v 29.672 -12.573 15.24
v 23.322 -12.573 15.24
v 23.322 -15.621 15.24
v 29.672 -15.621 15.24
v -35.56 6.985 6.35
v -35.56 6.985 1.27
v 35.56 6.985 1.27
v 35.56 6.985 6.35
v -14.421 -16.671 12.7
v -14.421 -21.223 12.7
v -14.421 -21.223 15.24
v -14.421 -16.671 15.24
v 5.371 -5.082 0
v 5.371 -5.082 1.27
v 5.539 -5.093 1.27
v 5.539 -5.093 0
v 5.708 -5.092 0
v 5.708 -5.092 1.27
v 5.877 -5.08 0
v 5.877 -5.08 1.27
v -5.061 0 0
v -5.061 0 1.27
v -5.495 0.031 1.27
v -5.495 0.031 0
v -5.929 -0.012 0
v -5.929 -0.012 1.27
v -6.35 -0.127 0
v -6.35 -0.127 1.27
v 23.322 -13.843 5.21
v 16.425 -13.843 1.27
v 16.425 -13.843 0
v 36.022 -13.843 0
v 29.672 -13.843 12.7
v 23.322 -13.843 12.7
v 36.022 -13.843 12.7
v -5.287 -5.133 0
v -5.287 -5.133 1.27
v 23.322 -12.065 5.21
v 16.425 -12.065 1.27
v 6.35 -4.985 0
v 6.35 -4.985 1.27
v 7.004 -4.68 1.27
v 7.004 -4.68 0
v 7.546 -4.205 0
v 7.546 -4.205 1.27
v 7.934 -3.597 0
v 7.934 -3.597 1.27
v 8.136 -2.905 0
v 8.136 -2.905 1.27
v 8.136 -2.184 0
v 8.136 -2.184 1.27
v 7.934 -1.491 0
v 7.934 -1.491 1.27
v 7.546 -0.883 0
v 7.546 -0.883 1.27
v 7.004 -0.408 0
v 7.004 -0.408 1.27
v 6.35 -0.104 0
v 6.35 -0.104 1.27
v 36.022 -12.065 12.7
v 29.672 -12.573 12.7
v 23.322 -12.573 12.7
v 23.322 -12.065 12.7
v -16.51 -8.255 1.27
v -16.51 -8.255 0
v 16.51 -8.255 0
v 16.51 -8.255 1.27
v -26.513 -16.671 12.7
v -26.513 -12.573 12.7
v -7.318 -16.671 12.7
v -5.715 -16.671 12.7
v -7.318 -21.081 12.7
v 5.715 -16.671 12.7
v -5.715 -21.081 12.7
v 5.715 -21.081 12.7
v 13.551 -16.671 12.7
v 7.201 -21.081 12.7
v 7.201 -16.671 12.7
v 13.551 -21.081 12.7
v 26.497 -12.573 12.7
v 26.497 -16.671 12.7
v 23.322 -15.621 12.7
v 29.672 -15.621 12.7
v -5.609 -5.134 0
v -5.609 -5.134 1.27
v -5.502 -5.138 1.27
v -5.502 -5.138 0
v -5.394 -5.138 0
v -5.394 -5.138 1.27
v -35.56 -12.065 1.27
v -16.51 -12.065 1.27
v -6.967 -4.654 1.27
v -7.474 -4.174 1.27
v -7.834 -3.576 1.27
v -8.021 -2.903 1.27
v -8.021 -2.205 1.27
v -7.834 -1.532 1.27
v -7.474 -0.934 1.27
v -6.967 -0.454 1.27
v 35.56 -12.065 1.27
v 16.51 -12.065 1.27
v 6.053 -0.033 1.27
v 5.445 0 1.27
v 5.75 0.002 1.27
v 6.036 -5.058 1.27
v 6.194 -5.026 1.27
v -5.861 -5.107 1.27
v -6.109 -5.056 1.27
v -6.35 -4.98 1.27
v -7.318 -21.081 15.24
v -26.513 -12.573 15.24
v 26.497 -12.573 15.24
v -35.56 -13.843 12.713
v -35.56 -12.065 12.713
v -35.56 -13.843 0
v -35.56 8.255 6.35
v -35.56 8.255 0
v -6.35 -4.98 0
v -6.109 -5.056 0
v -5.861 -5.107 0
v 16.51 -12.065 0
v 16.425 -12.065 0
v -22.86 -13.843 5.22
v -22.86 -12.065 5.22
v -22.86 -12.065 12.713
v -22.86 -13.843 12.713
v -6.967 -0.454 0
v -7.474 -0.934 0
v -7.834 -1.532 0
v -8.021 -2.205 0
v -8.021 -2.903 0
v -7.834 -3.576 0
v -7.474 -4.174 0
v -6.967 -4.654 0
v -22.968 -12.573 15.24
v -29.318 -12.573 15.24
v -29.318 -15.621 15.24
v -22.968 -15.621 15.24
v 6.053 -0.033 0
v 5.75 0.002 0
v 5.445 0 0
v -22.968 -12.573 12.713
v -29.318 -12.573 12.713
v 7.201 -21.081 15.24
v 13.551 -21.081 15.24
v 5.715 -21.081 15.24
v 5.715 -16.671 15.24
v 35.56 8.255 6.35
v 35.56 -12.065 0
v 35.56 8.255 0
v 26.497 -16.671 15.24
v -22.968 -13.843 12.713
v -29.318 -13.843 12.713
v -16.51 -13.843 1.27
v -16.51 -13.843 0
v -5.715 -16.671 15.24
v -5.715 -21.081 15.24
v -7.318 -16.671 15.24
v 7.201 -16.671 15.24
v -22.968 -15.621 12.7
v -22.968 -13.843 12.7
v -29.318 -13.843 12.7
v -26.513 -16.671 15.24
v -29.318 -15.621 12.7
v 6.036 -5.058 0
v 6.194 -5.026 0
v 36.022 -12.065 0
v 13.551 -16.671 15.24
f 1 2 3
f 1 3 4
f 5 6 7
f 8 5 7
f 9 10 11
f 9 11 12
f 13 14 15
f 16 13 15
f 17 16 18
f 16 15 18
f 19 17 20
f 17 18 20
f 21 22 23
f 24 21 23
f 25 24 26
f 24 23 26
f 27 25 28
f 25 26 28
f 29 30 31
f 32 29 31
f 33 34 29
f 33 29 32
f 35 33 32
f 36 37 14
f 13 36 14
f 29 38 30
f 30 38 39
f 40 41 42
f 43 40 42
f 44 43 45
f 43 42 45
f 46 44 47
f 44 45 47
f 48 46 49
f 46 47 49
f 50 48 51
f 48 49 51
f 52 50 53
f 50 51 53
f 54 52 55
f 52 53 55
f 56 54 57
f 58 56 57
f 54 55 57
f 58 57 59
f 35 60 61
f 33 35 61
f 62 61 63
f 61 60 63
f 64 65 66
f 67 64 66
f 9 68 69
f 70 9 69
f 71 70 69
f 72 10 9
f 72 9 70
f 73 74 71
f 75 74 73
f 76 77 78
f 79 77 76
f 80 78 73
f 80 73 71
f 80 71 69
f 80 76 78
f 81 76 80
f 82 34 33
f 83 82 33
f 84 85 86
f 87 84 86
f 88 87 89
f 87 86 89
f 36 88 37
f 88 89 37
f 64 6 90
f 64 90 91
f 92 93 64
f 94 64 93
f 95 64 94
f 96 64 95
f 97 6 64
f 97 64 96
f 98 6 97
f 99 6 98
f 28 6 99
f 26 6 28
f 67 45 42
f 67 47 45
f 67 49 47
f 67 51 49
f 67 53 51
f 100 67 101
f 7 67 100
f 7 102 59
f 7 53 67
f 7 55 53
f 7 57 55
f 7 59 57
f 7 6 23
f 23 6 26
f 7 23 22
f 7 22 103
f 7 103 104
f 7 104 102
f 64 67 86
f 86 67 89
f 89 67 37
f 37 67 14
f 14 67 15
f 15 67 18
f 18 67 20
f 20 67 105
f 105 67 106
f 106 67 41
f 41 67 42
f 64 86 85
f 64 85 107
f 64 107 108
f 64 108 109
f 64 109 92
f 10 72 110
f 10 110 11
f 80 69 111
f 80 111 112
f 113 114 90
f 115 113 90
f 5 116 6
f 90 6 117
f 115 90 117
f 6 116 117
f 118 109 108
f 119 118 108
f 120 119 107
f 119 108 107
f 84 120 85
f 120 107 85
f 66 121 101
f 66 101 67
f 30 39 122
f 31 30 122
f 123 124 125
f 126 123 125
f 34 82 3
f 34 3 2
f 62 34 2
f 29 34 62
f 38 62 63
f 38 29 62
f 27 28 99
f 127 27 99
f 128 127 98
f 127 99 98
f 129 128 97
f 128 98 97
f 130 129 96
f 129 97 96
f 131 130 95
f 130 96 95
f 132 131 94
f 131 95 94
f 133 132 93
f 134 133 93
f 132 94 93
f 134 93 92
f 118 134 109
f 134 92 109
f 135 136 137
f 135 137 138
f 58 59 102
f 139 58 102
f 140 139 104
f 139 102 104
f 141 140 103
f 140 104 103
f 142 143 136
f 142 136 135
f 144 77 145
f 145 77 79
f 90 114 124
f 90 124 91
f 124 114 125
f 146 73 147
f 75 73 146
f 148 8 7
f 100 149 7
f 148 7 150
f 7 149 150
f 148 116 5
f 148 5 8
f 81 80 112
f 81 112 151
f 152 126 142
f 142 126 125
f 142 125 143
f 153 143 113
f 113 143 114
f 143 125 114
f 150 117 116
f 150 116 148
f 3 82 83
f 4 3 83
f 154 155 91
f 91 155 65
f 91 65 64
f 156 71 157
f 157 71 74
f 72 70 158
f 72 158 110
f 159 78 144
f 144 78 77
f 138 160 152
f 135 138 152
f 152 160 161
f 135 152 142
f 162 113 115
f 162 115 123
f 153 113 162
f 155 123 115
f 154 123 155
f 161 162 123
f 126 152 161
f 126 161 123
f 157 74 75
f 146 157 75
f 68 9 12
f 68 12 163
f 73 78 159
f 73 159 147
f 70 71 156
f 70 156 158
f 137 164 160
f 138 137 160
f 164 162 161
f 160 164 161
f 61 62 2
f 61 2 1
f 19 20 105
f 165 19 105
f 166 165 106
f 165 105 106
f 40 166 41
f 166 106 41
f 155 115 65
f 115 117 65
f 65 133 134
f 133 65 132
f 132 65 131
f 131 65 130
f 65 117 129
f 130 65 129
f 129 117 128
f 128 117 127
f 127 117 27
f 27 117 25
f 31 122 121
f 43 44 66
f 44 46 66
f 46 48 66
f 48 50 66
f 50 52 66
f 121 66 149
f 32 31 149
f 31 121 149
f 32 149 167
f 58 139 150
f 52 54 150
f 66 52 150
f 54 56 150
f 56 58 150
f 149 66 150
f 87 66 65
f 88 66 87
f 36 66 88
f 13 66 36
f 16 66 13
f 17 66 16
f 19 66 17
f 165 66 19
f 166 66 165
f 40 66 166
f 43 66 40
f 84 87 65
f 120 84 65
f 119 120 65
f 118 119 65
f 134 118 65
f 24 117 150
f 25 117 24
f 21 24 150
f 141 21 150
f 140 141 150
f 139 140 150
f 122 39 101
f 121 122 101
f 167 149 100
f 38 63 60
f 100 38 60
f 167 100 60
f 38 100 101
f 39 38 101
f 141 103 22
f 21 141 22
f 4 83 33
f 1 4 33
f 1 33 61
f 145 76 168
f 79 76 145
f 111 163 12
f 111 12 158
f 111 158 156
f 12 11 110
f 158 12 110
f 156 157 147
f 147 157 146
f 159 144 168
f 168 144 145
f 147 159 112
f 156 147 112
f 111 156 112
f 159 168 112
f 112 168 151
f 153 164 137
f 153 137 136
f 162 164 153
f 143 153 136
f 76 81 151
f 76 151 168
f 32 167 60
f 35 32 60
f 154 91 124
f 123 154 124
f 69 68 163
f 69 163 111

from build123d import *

# Parameters (mm, degrees)
F0_W      = 19.05
F0_H      = 3.81
F1_DEPTH  = 1.27
F3_DEPTH  = 25.4
F4_W      = 71.12
F4_H      = 1.27
F5_DEPTH  = 5.08
F7_DEPTH  = 1.778
F8_W      = 6.35
F8_H      = 3.048
F9_DEPTH  = 2.54
F10_W     = 6.35
F10_H     = 2.1337494254
F10_H_2   = 4.4097490609
F10_W_2   = 11.43
F11_DEPTH = 2.54


with BuildPart() as f1:
    # F0 (on Top) → F1 (new body)
    with BuildSketch(Plane.XY):
        with Locations((26.035, -10.16)):
            Rectangle(F0_W, F0_H)
        Polygon((16.51, -8.255), (35.56, -8.255), (35.56, 8.255), (-35.56, 8.255), (-35.56, -8.255), (-16.51, -8.255), align=None)
        with Locations((-26.035, -10.16)):
            Rectangle(F0_W, F0_H)
    extrude(amount=F1_DEPTH)

    # F2 (on face) → F3 (cut)
    with BuildSketch(Plane.XY.offset(1.27)):
        with BuildLine():
            ThreePointArc((5.8767703432, -5.08), (6.1156478498, -5.043531091), (6.35, -4.984611534))
            Line((6.35, -4.984611534), (6.35, -0.1037009401))
            ThreePointArc((6.35, -0.1037009401), (5.9019976777, -0.0110749589), (5.4446542636, 0))
            Line((5.4446542636, 0), (-5.0605102442, 0))
            ThreePointArc((-5.0605102442, 0), (-5.7133351112, 0.018668554), (-6.35, -0.1268877624))
            Line((-6.35, -0.1268877624), (-6.35, -4.9804089291))
            ThreePointArc((-6.35, -4.9804089291), (-5.9853889631, -5.0844735945), (-5.6094763407, -5.1340756427))
            Line((-5.6094763407, -5.1340756427), (-5.2866646278, -5.1325558903))
            Line((-5.2866646278, -5.1325558903), (5.3708199921, -5.0823819435))
            Line((5.3708199921, -5.0823819435), (5.8767703432, -5.08))
        make_face()
        with BuildLine():
            Line((6.35, -0.1037009401), (6.35, -4.984611534))
            ThreePointArc((6.35, -4.984611534), (8.1614954052, -2.5441562371), (6.35, -0.1037009401))
        make_face()
        with BuildLine():
            ThreePointArc((5.3708199921, -5.0823819435), (5.6238543984, -5.0937722247), (5.8767703432, -5.08))
            Line((5.8767703432, -5.08), (5.3708199921, -5.0823819435))
        make_face()
        with BuildLine():
            ThreePointArc((-5.6094763407, -5.1340756427), (-5.4480467354, -5.1383602933), (-5.2866646278, -5.1325558903))
            Line((-5.2866646278, -5.1325558903), (-5.6094763407, -5.1340756427))
        make_face()
        with BuildLine():
            Line((-6.35, -4.9804089291), (-6.35, -0.1268877624))
            ThreePointArc((-6.35, -0.1268877624), (-8.0449557888, -2.5536483457), (-6.35, -4.9804089291))
        make_face()
    extrude(amount=-F3_DEPTH, mode=Mode.SUBTRACT)

    # F4 (on face) → F5 (join)
    with BuildSketch(Plane.XY.offset(1.27)):
        with Locations((0, 7.62)):
            Rectangle(F4_W, F4_H)
    extrude(amount=F5_DEPTH)

    # F6 (on face) → F7 (join)
    with BuildSketch(Plane.XZ.offset(12.065)):
        Polygon((-35.56, 12.7126304433), (-35.56, 0), (-16.51, 0), (-16.51, 1.27), (-22.86, 5.2196304433), (-22.86, 12.7126304433), align=None)
        Polygon((16.424678266, 0), (36.0221016824, 0), (36.0221016824, 12.7), (23.3221016824, 12.7), (23.3221016824, 5.210170988), (16.424678266, 1.27), align=None)
    extrude(amount=F7_DEPTH)

    # F8 (on face) → F9 (join)
    with BuildSketch(Plane.XY.offset(12.7)):
        with Locations((26.4971016824, -14.097)):
            Rectangle(F8_W, F8_H)
        with Locations((-26.1428912252, -14.097)):
            Rectangle(F8_W, F8_H)
    extrude(amount=F9_DEPTH)


with BuildPart() as f11:
    # F10 (on face) → F11 (new body)
    with BuildSketch(Plane(origin=(0, 0, 12.7), x_dir=(1, 0, 0), z_dir=(0, 0, -1))):
        Polygon((-26.5127364546, 12.573), (26.4971016824, 12.573), (26.4971016824, 16.6712477803), (13.550515829, 16.6712477803), (13.550515829, 14.5374983549), (7.200515829, 14.5374983549), (7.200515829, 16.6712477803), (5.715, 16.6712477803), (5.715, 14.5374983549), (-5.715, 14.5374983549), (-5.715, 16.6712477803), (-7.3176398873, 16.6712477803), (-7.3176398873, 14.418842271), (-14.4214853644, 14.5374983549), (-14.4214853644, 16.6712477803), (-26.5127364546, 16.6712477803), align=None)
        with Locations((10.375515829, 15.6043730676)):
            Rectangle(F10_W, F10_H)
        with Locations((10.375515829, 18.8761223108)):
            Rectangle(F10_W, F10_H_2)
        Polygon((-14.4214853644, 21.2232470512), (-14.4214853644, 16.6712477803), (-7.3176398873, 16.6712477803), (-7.3176398873, 21.0809968412), align=None)
        Polygon((-7.3176398873, 16.6712477803), (-14.4214853644, 16.6712477803), (-14.4214853644, 14.5374983549), (-7.3176398873, 14.418842271), align=None)
        with Locations((0, 15.6043730676)):
            Rectangle(F10_W_2, F10_H)
        with Locations((0, 18.8761223108)):
            Rectangle(F10_W_2, F10_H_2)
    extrude(amount=-F11_DEPTH)


solid = Compound([f1.part, f11.part])
